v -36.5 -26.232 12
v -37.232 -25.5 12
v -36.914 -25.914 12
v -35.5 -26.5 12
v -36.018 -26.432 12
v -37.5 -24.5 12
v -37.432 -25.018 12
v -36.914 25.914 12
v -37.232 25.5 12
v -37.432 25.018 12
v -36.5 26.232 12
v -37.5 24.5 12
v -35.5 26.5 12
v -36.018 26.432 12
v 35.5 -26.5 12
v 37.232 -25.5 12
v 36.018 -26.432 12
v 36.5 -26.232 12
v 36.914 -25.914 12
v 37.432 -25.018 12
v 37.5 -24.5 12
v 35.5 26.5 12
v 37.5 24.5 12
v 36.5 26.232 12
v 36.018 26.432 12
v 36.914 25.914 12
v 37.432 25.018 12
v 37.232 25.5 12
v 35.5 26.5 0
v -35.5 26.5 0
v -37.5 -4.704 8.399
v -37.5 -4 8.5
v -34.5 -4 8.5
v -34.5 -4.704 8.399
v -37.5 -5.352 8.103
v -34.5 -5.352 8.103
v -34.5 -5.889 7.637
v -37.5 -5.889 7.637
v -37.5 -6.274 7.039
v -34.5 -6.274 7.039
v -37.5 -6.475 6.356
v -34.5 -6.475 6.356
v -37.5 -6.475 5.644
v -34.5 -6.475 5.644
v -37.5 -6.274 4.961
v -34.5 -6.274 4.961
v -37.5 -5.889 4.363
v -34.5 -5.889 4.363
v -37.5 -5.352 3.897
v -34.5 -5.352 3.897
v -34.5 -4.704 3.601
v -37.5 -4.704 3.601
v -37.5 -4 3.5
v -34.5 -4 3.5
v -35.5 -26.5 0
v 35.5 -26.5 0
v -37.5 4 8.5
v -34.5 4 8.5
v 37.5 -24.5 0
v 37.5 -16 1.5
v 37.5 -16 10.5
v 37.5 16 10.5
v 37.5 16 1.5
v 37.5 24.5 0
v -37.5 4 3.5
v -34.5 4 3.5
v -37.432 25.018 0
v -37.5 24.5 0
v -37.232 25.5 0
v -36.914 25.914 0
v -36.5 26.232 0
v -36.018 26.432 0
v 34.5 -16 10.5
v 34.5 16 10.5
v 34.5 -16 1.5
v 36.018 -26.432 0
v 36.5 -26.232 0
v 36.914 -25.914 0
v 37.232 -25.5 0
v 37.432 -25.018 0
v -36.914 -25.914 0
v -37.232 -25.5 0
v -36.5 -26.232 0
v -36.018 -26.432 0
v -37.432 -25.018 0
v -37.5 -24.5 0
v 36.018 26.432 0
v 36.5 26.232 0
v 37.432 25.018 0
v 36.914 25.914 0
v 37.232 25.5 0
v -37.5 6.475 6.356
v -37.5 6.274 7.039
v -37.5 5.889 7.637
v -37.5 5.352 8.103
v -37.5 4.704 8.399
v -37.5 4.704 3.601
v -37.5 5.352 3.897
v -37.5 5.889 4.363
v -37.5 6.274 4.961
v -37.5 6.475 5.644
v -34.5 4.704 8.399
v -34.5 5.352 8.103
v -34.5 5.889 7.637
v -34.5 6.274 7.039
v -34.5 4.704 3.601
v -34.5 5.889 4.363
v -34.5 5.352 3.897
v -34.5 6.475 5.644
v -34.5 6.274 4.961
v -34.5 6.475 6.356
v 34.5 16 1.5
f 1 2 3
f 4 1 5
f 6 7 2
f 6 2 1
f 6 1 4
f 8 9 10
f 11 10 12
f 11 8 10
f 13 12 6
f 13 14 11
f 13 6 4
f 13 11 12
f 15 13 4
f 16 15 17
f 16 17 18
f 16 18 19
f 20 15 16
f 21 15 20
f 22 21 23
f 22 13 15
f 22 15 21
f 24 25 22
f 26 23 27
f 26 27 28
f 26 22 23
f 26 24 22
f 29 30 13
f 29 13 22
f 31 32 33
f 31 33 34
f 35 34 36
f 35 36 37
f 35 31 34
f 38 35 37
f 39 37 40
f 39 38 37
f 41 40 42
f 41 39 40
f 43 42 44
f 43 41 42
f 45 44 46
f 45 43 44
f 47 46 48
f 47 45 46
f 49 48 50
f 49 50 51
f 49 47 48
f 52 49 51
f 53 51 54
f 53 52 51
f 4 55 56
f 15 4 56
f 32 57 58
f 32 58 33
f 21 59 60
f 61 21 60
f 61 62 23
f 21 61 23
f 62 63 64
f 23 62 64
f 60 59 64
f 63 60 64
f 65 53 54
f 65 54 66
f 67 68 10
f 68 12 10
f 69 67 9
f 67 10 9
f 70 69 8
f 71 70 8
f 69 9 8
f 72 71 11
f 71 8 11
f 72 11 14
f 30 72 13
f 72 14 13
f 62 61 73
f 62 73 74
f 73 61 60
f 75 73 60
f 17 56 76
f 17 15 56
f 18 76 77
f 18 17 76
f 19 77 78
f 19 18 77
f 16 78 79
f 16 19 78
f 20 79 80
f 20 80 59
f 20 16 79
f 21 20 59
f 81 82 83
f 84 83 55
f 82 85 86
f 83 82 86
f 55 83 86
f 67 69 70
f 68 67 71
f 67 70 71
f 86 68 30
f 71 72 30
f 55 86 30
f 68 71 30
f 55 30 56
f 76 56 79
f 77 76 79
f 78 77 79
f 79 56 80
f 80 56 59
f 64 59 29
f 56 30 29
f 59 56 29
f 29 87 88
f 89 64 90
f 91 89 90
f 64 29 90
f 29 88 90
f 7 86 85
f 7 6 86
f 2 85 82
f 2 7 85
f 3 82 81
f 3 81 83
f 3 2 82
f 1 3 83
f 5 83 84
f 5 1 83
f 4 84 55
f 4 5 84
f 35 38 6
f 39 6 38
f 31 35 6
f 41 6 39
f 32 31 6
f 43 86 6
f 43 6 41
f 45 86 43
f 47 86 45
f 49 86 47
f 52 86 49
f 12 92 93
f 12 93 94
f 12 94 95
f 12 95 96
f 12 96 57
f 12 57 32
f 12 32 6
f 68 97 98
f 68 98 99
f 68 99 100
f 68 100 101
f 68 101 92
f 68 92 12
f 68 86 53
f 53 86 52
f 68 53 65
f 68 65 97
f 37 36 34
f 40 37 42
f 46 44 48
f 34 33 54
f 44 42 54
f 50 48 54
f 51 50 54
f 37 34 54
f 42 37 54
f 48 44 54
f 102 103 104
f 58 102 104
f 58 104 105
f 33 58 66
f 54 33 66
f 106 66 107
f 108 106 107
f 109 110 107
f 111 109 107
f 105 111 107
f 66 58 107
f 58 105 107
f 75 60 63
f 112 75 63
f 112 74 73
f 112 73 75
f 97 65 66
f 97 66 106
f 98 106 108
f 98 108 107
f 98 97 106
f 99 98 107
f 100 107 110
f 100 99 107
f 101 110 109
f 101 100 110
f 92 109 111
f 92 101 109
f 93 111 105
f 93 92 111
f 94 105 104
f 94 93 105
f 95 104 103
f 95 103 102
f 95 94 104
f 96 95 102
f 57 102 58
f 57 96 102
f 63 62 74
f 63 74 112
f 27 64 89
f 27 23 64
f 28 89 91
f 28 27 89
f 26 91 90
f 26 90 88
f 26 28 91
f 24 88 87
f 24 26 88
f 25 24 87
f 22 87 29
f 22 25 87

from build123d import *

# Parameters (mm, degrees)
SKETCH_1_W          = 75
SKETCH_1_H          = 53
EXTRUDE_1_DEPTH     = 12
FILLET_1_R          = 2
SKETCH_2_W          = 9
SKETCH_2_H          = 32
CUT_EXTRUDE_1_DEPTH = 3
CUT_EXTRUDE_2_DEPTH = 3


with BuildPart() as part:
    # 草图1 → 凸台-拉伸1 (new body)
    with BuildSketch(Plane.XY):
        Rectangle(SKETCH_1_W, SKETCH_1_H)
    extrude(amount=EXTRUDE_1_DEPTH)

    # 圆角1
    fillet_1_edges = [part.edges().sort_by_distance(p)[0] for p in [
        (-37.5, 26.5, 6),
        (37.5, 26.5, 6),
        (37.5, -26.5, 6),
        (-37.5, -26.5, 6),
    ]]
    fillet(fillet_1_edges, radius=FILLET_1_R)

    # 草图2 → 切除-拉伸1 (cut)
    with BuildSketch(Plane(origin=(37.5, 0, 0), x_dir=(0, 0, -1), z_dir=(1, 0, 0))):
        with Locations((-6, 0)):
            Rectangle(SKETCH_2_W, SKETCH_2_H)
    extrude(amount=-CUT_EXTRUDE_1_DEPTH, mode=Mode.SUBTRACT)

    # 草图3 → 切除-拉伸2 (cut)
    with BuildSketch(Plane.ZY.offset(37.5)):
        with BuildLine():
            Line((3.5, -4), (3.5, 4))
            ThreePointArc((3.5, 4), (6, 6.5), (8.5, 4))
            Line((8.5, 4), (8.5, -4))
            ThreePointArc((8.5, -4), (6, -6.5), (3.5, -4))
        make_face()
    extrude(amount=-CUT_EXTRUDE_2_DEPTH, mode=Mode.SUBTRACT)


solid = part.part
